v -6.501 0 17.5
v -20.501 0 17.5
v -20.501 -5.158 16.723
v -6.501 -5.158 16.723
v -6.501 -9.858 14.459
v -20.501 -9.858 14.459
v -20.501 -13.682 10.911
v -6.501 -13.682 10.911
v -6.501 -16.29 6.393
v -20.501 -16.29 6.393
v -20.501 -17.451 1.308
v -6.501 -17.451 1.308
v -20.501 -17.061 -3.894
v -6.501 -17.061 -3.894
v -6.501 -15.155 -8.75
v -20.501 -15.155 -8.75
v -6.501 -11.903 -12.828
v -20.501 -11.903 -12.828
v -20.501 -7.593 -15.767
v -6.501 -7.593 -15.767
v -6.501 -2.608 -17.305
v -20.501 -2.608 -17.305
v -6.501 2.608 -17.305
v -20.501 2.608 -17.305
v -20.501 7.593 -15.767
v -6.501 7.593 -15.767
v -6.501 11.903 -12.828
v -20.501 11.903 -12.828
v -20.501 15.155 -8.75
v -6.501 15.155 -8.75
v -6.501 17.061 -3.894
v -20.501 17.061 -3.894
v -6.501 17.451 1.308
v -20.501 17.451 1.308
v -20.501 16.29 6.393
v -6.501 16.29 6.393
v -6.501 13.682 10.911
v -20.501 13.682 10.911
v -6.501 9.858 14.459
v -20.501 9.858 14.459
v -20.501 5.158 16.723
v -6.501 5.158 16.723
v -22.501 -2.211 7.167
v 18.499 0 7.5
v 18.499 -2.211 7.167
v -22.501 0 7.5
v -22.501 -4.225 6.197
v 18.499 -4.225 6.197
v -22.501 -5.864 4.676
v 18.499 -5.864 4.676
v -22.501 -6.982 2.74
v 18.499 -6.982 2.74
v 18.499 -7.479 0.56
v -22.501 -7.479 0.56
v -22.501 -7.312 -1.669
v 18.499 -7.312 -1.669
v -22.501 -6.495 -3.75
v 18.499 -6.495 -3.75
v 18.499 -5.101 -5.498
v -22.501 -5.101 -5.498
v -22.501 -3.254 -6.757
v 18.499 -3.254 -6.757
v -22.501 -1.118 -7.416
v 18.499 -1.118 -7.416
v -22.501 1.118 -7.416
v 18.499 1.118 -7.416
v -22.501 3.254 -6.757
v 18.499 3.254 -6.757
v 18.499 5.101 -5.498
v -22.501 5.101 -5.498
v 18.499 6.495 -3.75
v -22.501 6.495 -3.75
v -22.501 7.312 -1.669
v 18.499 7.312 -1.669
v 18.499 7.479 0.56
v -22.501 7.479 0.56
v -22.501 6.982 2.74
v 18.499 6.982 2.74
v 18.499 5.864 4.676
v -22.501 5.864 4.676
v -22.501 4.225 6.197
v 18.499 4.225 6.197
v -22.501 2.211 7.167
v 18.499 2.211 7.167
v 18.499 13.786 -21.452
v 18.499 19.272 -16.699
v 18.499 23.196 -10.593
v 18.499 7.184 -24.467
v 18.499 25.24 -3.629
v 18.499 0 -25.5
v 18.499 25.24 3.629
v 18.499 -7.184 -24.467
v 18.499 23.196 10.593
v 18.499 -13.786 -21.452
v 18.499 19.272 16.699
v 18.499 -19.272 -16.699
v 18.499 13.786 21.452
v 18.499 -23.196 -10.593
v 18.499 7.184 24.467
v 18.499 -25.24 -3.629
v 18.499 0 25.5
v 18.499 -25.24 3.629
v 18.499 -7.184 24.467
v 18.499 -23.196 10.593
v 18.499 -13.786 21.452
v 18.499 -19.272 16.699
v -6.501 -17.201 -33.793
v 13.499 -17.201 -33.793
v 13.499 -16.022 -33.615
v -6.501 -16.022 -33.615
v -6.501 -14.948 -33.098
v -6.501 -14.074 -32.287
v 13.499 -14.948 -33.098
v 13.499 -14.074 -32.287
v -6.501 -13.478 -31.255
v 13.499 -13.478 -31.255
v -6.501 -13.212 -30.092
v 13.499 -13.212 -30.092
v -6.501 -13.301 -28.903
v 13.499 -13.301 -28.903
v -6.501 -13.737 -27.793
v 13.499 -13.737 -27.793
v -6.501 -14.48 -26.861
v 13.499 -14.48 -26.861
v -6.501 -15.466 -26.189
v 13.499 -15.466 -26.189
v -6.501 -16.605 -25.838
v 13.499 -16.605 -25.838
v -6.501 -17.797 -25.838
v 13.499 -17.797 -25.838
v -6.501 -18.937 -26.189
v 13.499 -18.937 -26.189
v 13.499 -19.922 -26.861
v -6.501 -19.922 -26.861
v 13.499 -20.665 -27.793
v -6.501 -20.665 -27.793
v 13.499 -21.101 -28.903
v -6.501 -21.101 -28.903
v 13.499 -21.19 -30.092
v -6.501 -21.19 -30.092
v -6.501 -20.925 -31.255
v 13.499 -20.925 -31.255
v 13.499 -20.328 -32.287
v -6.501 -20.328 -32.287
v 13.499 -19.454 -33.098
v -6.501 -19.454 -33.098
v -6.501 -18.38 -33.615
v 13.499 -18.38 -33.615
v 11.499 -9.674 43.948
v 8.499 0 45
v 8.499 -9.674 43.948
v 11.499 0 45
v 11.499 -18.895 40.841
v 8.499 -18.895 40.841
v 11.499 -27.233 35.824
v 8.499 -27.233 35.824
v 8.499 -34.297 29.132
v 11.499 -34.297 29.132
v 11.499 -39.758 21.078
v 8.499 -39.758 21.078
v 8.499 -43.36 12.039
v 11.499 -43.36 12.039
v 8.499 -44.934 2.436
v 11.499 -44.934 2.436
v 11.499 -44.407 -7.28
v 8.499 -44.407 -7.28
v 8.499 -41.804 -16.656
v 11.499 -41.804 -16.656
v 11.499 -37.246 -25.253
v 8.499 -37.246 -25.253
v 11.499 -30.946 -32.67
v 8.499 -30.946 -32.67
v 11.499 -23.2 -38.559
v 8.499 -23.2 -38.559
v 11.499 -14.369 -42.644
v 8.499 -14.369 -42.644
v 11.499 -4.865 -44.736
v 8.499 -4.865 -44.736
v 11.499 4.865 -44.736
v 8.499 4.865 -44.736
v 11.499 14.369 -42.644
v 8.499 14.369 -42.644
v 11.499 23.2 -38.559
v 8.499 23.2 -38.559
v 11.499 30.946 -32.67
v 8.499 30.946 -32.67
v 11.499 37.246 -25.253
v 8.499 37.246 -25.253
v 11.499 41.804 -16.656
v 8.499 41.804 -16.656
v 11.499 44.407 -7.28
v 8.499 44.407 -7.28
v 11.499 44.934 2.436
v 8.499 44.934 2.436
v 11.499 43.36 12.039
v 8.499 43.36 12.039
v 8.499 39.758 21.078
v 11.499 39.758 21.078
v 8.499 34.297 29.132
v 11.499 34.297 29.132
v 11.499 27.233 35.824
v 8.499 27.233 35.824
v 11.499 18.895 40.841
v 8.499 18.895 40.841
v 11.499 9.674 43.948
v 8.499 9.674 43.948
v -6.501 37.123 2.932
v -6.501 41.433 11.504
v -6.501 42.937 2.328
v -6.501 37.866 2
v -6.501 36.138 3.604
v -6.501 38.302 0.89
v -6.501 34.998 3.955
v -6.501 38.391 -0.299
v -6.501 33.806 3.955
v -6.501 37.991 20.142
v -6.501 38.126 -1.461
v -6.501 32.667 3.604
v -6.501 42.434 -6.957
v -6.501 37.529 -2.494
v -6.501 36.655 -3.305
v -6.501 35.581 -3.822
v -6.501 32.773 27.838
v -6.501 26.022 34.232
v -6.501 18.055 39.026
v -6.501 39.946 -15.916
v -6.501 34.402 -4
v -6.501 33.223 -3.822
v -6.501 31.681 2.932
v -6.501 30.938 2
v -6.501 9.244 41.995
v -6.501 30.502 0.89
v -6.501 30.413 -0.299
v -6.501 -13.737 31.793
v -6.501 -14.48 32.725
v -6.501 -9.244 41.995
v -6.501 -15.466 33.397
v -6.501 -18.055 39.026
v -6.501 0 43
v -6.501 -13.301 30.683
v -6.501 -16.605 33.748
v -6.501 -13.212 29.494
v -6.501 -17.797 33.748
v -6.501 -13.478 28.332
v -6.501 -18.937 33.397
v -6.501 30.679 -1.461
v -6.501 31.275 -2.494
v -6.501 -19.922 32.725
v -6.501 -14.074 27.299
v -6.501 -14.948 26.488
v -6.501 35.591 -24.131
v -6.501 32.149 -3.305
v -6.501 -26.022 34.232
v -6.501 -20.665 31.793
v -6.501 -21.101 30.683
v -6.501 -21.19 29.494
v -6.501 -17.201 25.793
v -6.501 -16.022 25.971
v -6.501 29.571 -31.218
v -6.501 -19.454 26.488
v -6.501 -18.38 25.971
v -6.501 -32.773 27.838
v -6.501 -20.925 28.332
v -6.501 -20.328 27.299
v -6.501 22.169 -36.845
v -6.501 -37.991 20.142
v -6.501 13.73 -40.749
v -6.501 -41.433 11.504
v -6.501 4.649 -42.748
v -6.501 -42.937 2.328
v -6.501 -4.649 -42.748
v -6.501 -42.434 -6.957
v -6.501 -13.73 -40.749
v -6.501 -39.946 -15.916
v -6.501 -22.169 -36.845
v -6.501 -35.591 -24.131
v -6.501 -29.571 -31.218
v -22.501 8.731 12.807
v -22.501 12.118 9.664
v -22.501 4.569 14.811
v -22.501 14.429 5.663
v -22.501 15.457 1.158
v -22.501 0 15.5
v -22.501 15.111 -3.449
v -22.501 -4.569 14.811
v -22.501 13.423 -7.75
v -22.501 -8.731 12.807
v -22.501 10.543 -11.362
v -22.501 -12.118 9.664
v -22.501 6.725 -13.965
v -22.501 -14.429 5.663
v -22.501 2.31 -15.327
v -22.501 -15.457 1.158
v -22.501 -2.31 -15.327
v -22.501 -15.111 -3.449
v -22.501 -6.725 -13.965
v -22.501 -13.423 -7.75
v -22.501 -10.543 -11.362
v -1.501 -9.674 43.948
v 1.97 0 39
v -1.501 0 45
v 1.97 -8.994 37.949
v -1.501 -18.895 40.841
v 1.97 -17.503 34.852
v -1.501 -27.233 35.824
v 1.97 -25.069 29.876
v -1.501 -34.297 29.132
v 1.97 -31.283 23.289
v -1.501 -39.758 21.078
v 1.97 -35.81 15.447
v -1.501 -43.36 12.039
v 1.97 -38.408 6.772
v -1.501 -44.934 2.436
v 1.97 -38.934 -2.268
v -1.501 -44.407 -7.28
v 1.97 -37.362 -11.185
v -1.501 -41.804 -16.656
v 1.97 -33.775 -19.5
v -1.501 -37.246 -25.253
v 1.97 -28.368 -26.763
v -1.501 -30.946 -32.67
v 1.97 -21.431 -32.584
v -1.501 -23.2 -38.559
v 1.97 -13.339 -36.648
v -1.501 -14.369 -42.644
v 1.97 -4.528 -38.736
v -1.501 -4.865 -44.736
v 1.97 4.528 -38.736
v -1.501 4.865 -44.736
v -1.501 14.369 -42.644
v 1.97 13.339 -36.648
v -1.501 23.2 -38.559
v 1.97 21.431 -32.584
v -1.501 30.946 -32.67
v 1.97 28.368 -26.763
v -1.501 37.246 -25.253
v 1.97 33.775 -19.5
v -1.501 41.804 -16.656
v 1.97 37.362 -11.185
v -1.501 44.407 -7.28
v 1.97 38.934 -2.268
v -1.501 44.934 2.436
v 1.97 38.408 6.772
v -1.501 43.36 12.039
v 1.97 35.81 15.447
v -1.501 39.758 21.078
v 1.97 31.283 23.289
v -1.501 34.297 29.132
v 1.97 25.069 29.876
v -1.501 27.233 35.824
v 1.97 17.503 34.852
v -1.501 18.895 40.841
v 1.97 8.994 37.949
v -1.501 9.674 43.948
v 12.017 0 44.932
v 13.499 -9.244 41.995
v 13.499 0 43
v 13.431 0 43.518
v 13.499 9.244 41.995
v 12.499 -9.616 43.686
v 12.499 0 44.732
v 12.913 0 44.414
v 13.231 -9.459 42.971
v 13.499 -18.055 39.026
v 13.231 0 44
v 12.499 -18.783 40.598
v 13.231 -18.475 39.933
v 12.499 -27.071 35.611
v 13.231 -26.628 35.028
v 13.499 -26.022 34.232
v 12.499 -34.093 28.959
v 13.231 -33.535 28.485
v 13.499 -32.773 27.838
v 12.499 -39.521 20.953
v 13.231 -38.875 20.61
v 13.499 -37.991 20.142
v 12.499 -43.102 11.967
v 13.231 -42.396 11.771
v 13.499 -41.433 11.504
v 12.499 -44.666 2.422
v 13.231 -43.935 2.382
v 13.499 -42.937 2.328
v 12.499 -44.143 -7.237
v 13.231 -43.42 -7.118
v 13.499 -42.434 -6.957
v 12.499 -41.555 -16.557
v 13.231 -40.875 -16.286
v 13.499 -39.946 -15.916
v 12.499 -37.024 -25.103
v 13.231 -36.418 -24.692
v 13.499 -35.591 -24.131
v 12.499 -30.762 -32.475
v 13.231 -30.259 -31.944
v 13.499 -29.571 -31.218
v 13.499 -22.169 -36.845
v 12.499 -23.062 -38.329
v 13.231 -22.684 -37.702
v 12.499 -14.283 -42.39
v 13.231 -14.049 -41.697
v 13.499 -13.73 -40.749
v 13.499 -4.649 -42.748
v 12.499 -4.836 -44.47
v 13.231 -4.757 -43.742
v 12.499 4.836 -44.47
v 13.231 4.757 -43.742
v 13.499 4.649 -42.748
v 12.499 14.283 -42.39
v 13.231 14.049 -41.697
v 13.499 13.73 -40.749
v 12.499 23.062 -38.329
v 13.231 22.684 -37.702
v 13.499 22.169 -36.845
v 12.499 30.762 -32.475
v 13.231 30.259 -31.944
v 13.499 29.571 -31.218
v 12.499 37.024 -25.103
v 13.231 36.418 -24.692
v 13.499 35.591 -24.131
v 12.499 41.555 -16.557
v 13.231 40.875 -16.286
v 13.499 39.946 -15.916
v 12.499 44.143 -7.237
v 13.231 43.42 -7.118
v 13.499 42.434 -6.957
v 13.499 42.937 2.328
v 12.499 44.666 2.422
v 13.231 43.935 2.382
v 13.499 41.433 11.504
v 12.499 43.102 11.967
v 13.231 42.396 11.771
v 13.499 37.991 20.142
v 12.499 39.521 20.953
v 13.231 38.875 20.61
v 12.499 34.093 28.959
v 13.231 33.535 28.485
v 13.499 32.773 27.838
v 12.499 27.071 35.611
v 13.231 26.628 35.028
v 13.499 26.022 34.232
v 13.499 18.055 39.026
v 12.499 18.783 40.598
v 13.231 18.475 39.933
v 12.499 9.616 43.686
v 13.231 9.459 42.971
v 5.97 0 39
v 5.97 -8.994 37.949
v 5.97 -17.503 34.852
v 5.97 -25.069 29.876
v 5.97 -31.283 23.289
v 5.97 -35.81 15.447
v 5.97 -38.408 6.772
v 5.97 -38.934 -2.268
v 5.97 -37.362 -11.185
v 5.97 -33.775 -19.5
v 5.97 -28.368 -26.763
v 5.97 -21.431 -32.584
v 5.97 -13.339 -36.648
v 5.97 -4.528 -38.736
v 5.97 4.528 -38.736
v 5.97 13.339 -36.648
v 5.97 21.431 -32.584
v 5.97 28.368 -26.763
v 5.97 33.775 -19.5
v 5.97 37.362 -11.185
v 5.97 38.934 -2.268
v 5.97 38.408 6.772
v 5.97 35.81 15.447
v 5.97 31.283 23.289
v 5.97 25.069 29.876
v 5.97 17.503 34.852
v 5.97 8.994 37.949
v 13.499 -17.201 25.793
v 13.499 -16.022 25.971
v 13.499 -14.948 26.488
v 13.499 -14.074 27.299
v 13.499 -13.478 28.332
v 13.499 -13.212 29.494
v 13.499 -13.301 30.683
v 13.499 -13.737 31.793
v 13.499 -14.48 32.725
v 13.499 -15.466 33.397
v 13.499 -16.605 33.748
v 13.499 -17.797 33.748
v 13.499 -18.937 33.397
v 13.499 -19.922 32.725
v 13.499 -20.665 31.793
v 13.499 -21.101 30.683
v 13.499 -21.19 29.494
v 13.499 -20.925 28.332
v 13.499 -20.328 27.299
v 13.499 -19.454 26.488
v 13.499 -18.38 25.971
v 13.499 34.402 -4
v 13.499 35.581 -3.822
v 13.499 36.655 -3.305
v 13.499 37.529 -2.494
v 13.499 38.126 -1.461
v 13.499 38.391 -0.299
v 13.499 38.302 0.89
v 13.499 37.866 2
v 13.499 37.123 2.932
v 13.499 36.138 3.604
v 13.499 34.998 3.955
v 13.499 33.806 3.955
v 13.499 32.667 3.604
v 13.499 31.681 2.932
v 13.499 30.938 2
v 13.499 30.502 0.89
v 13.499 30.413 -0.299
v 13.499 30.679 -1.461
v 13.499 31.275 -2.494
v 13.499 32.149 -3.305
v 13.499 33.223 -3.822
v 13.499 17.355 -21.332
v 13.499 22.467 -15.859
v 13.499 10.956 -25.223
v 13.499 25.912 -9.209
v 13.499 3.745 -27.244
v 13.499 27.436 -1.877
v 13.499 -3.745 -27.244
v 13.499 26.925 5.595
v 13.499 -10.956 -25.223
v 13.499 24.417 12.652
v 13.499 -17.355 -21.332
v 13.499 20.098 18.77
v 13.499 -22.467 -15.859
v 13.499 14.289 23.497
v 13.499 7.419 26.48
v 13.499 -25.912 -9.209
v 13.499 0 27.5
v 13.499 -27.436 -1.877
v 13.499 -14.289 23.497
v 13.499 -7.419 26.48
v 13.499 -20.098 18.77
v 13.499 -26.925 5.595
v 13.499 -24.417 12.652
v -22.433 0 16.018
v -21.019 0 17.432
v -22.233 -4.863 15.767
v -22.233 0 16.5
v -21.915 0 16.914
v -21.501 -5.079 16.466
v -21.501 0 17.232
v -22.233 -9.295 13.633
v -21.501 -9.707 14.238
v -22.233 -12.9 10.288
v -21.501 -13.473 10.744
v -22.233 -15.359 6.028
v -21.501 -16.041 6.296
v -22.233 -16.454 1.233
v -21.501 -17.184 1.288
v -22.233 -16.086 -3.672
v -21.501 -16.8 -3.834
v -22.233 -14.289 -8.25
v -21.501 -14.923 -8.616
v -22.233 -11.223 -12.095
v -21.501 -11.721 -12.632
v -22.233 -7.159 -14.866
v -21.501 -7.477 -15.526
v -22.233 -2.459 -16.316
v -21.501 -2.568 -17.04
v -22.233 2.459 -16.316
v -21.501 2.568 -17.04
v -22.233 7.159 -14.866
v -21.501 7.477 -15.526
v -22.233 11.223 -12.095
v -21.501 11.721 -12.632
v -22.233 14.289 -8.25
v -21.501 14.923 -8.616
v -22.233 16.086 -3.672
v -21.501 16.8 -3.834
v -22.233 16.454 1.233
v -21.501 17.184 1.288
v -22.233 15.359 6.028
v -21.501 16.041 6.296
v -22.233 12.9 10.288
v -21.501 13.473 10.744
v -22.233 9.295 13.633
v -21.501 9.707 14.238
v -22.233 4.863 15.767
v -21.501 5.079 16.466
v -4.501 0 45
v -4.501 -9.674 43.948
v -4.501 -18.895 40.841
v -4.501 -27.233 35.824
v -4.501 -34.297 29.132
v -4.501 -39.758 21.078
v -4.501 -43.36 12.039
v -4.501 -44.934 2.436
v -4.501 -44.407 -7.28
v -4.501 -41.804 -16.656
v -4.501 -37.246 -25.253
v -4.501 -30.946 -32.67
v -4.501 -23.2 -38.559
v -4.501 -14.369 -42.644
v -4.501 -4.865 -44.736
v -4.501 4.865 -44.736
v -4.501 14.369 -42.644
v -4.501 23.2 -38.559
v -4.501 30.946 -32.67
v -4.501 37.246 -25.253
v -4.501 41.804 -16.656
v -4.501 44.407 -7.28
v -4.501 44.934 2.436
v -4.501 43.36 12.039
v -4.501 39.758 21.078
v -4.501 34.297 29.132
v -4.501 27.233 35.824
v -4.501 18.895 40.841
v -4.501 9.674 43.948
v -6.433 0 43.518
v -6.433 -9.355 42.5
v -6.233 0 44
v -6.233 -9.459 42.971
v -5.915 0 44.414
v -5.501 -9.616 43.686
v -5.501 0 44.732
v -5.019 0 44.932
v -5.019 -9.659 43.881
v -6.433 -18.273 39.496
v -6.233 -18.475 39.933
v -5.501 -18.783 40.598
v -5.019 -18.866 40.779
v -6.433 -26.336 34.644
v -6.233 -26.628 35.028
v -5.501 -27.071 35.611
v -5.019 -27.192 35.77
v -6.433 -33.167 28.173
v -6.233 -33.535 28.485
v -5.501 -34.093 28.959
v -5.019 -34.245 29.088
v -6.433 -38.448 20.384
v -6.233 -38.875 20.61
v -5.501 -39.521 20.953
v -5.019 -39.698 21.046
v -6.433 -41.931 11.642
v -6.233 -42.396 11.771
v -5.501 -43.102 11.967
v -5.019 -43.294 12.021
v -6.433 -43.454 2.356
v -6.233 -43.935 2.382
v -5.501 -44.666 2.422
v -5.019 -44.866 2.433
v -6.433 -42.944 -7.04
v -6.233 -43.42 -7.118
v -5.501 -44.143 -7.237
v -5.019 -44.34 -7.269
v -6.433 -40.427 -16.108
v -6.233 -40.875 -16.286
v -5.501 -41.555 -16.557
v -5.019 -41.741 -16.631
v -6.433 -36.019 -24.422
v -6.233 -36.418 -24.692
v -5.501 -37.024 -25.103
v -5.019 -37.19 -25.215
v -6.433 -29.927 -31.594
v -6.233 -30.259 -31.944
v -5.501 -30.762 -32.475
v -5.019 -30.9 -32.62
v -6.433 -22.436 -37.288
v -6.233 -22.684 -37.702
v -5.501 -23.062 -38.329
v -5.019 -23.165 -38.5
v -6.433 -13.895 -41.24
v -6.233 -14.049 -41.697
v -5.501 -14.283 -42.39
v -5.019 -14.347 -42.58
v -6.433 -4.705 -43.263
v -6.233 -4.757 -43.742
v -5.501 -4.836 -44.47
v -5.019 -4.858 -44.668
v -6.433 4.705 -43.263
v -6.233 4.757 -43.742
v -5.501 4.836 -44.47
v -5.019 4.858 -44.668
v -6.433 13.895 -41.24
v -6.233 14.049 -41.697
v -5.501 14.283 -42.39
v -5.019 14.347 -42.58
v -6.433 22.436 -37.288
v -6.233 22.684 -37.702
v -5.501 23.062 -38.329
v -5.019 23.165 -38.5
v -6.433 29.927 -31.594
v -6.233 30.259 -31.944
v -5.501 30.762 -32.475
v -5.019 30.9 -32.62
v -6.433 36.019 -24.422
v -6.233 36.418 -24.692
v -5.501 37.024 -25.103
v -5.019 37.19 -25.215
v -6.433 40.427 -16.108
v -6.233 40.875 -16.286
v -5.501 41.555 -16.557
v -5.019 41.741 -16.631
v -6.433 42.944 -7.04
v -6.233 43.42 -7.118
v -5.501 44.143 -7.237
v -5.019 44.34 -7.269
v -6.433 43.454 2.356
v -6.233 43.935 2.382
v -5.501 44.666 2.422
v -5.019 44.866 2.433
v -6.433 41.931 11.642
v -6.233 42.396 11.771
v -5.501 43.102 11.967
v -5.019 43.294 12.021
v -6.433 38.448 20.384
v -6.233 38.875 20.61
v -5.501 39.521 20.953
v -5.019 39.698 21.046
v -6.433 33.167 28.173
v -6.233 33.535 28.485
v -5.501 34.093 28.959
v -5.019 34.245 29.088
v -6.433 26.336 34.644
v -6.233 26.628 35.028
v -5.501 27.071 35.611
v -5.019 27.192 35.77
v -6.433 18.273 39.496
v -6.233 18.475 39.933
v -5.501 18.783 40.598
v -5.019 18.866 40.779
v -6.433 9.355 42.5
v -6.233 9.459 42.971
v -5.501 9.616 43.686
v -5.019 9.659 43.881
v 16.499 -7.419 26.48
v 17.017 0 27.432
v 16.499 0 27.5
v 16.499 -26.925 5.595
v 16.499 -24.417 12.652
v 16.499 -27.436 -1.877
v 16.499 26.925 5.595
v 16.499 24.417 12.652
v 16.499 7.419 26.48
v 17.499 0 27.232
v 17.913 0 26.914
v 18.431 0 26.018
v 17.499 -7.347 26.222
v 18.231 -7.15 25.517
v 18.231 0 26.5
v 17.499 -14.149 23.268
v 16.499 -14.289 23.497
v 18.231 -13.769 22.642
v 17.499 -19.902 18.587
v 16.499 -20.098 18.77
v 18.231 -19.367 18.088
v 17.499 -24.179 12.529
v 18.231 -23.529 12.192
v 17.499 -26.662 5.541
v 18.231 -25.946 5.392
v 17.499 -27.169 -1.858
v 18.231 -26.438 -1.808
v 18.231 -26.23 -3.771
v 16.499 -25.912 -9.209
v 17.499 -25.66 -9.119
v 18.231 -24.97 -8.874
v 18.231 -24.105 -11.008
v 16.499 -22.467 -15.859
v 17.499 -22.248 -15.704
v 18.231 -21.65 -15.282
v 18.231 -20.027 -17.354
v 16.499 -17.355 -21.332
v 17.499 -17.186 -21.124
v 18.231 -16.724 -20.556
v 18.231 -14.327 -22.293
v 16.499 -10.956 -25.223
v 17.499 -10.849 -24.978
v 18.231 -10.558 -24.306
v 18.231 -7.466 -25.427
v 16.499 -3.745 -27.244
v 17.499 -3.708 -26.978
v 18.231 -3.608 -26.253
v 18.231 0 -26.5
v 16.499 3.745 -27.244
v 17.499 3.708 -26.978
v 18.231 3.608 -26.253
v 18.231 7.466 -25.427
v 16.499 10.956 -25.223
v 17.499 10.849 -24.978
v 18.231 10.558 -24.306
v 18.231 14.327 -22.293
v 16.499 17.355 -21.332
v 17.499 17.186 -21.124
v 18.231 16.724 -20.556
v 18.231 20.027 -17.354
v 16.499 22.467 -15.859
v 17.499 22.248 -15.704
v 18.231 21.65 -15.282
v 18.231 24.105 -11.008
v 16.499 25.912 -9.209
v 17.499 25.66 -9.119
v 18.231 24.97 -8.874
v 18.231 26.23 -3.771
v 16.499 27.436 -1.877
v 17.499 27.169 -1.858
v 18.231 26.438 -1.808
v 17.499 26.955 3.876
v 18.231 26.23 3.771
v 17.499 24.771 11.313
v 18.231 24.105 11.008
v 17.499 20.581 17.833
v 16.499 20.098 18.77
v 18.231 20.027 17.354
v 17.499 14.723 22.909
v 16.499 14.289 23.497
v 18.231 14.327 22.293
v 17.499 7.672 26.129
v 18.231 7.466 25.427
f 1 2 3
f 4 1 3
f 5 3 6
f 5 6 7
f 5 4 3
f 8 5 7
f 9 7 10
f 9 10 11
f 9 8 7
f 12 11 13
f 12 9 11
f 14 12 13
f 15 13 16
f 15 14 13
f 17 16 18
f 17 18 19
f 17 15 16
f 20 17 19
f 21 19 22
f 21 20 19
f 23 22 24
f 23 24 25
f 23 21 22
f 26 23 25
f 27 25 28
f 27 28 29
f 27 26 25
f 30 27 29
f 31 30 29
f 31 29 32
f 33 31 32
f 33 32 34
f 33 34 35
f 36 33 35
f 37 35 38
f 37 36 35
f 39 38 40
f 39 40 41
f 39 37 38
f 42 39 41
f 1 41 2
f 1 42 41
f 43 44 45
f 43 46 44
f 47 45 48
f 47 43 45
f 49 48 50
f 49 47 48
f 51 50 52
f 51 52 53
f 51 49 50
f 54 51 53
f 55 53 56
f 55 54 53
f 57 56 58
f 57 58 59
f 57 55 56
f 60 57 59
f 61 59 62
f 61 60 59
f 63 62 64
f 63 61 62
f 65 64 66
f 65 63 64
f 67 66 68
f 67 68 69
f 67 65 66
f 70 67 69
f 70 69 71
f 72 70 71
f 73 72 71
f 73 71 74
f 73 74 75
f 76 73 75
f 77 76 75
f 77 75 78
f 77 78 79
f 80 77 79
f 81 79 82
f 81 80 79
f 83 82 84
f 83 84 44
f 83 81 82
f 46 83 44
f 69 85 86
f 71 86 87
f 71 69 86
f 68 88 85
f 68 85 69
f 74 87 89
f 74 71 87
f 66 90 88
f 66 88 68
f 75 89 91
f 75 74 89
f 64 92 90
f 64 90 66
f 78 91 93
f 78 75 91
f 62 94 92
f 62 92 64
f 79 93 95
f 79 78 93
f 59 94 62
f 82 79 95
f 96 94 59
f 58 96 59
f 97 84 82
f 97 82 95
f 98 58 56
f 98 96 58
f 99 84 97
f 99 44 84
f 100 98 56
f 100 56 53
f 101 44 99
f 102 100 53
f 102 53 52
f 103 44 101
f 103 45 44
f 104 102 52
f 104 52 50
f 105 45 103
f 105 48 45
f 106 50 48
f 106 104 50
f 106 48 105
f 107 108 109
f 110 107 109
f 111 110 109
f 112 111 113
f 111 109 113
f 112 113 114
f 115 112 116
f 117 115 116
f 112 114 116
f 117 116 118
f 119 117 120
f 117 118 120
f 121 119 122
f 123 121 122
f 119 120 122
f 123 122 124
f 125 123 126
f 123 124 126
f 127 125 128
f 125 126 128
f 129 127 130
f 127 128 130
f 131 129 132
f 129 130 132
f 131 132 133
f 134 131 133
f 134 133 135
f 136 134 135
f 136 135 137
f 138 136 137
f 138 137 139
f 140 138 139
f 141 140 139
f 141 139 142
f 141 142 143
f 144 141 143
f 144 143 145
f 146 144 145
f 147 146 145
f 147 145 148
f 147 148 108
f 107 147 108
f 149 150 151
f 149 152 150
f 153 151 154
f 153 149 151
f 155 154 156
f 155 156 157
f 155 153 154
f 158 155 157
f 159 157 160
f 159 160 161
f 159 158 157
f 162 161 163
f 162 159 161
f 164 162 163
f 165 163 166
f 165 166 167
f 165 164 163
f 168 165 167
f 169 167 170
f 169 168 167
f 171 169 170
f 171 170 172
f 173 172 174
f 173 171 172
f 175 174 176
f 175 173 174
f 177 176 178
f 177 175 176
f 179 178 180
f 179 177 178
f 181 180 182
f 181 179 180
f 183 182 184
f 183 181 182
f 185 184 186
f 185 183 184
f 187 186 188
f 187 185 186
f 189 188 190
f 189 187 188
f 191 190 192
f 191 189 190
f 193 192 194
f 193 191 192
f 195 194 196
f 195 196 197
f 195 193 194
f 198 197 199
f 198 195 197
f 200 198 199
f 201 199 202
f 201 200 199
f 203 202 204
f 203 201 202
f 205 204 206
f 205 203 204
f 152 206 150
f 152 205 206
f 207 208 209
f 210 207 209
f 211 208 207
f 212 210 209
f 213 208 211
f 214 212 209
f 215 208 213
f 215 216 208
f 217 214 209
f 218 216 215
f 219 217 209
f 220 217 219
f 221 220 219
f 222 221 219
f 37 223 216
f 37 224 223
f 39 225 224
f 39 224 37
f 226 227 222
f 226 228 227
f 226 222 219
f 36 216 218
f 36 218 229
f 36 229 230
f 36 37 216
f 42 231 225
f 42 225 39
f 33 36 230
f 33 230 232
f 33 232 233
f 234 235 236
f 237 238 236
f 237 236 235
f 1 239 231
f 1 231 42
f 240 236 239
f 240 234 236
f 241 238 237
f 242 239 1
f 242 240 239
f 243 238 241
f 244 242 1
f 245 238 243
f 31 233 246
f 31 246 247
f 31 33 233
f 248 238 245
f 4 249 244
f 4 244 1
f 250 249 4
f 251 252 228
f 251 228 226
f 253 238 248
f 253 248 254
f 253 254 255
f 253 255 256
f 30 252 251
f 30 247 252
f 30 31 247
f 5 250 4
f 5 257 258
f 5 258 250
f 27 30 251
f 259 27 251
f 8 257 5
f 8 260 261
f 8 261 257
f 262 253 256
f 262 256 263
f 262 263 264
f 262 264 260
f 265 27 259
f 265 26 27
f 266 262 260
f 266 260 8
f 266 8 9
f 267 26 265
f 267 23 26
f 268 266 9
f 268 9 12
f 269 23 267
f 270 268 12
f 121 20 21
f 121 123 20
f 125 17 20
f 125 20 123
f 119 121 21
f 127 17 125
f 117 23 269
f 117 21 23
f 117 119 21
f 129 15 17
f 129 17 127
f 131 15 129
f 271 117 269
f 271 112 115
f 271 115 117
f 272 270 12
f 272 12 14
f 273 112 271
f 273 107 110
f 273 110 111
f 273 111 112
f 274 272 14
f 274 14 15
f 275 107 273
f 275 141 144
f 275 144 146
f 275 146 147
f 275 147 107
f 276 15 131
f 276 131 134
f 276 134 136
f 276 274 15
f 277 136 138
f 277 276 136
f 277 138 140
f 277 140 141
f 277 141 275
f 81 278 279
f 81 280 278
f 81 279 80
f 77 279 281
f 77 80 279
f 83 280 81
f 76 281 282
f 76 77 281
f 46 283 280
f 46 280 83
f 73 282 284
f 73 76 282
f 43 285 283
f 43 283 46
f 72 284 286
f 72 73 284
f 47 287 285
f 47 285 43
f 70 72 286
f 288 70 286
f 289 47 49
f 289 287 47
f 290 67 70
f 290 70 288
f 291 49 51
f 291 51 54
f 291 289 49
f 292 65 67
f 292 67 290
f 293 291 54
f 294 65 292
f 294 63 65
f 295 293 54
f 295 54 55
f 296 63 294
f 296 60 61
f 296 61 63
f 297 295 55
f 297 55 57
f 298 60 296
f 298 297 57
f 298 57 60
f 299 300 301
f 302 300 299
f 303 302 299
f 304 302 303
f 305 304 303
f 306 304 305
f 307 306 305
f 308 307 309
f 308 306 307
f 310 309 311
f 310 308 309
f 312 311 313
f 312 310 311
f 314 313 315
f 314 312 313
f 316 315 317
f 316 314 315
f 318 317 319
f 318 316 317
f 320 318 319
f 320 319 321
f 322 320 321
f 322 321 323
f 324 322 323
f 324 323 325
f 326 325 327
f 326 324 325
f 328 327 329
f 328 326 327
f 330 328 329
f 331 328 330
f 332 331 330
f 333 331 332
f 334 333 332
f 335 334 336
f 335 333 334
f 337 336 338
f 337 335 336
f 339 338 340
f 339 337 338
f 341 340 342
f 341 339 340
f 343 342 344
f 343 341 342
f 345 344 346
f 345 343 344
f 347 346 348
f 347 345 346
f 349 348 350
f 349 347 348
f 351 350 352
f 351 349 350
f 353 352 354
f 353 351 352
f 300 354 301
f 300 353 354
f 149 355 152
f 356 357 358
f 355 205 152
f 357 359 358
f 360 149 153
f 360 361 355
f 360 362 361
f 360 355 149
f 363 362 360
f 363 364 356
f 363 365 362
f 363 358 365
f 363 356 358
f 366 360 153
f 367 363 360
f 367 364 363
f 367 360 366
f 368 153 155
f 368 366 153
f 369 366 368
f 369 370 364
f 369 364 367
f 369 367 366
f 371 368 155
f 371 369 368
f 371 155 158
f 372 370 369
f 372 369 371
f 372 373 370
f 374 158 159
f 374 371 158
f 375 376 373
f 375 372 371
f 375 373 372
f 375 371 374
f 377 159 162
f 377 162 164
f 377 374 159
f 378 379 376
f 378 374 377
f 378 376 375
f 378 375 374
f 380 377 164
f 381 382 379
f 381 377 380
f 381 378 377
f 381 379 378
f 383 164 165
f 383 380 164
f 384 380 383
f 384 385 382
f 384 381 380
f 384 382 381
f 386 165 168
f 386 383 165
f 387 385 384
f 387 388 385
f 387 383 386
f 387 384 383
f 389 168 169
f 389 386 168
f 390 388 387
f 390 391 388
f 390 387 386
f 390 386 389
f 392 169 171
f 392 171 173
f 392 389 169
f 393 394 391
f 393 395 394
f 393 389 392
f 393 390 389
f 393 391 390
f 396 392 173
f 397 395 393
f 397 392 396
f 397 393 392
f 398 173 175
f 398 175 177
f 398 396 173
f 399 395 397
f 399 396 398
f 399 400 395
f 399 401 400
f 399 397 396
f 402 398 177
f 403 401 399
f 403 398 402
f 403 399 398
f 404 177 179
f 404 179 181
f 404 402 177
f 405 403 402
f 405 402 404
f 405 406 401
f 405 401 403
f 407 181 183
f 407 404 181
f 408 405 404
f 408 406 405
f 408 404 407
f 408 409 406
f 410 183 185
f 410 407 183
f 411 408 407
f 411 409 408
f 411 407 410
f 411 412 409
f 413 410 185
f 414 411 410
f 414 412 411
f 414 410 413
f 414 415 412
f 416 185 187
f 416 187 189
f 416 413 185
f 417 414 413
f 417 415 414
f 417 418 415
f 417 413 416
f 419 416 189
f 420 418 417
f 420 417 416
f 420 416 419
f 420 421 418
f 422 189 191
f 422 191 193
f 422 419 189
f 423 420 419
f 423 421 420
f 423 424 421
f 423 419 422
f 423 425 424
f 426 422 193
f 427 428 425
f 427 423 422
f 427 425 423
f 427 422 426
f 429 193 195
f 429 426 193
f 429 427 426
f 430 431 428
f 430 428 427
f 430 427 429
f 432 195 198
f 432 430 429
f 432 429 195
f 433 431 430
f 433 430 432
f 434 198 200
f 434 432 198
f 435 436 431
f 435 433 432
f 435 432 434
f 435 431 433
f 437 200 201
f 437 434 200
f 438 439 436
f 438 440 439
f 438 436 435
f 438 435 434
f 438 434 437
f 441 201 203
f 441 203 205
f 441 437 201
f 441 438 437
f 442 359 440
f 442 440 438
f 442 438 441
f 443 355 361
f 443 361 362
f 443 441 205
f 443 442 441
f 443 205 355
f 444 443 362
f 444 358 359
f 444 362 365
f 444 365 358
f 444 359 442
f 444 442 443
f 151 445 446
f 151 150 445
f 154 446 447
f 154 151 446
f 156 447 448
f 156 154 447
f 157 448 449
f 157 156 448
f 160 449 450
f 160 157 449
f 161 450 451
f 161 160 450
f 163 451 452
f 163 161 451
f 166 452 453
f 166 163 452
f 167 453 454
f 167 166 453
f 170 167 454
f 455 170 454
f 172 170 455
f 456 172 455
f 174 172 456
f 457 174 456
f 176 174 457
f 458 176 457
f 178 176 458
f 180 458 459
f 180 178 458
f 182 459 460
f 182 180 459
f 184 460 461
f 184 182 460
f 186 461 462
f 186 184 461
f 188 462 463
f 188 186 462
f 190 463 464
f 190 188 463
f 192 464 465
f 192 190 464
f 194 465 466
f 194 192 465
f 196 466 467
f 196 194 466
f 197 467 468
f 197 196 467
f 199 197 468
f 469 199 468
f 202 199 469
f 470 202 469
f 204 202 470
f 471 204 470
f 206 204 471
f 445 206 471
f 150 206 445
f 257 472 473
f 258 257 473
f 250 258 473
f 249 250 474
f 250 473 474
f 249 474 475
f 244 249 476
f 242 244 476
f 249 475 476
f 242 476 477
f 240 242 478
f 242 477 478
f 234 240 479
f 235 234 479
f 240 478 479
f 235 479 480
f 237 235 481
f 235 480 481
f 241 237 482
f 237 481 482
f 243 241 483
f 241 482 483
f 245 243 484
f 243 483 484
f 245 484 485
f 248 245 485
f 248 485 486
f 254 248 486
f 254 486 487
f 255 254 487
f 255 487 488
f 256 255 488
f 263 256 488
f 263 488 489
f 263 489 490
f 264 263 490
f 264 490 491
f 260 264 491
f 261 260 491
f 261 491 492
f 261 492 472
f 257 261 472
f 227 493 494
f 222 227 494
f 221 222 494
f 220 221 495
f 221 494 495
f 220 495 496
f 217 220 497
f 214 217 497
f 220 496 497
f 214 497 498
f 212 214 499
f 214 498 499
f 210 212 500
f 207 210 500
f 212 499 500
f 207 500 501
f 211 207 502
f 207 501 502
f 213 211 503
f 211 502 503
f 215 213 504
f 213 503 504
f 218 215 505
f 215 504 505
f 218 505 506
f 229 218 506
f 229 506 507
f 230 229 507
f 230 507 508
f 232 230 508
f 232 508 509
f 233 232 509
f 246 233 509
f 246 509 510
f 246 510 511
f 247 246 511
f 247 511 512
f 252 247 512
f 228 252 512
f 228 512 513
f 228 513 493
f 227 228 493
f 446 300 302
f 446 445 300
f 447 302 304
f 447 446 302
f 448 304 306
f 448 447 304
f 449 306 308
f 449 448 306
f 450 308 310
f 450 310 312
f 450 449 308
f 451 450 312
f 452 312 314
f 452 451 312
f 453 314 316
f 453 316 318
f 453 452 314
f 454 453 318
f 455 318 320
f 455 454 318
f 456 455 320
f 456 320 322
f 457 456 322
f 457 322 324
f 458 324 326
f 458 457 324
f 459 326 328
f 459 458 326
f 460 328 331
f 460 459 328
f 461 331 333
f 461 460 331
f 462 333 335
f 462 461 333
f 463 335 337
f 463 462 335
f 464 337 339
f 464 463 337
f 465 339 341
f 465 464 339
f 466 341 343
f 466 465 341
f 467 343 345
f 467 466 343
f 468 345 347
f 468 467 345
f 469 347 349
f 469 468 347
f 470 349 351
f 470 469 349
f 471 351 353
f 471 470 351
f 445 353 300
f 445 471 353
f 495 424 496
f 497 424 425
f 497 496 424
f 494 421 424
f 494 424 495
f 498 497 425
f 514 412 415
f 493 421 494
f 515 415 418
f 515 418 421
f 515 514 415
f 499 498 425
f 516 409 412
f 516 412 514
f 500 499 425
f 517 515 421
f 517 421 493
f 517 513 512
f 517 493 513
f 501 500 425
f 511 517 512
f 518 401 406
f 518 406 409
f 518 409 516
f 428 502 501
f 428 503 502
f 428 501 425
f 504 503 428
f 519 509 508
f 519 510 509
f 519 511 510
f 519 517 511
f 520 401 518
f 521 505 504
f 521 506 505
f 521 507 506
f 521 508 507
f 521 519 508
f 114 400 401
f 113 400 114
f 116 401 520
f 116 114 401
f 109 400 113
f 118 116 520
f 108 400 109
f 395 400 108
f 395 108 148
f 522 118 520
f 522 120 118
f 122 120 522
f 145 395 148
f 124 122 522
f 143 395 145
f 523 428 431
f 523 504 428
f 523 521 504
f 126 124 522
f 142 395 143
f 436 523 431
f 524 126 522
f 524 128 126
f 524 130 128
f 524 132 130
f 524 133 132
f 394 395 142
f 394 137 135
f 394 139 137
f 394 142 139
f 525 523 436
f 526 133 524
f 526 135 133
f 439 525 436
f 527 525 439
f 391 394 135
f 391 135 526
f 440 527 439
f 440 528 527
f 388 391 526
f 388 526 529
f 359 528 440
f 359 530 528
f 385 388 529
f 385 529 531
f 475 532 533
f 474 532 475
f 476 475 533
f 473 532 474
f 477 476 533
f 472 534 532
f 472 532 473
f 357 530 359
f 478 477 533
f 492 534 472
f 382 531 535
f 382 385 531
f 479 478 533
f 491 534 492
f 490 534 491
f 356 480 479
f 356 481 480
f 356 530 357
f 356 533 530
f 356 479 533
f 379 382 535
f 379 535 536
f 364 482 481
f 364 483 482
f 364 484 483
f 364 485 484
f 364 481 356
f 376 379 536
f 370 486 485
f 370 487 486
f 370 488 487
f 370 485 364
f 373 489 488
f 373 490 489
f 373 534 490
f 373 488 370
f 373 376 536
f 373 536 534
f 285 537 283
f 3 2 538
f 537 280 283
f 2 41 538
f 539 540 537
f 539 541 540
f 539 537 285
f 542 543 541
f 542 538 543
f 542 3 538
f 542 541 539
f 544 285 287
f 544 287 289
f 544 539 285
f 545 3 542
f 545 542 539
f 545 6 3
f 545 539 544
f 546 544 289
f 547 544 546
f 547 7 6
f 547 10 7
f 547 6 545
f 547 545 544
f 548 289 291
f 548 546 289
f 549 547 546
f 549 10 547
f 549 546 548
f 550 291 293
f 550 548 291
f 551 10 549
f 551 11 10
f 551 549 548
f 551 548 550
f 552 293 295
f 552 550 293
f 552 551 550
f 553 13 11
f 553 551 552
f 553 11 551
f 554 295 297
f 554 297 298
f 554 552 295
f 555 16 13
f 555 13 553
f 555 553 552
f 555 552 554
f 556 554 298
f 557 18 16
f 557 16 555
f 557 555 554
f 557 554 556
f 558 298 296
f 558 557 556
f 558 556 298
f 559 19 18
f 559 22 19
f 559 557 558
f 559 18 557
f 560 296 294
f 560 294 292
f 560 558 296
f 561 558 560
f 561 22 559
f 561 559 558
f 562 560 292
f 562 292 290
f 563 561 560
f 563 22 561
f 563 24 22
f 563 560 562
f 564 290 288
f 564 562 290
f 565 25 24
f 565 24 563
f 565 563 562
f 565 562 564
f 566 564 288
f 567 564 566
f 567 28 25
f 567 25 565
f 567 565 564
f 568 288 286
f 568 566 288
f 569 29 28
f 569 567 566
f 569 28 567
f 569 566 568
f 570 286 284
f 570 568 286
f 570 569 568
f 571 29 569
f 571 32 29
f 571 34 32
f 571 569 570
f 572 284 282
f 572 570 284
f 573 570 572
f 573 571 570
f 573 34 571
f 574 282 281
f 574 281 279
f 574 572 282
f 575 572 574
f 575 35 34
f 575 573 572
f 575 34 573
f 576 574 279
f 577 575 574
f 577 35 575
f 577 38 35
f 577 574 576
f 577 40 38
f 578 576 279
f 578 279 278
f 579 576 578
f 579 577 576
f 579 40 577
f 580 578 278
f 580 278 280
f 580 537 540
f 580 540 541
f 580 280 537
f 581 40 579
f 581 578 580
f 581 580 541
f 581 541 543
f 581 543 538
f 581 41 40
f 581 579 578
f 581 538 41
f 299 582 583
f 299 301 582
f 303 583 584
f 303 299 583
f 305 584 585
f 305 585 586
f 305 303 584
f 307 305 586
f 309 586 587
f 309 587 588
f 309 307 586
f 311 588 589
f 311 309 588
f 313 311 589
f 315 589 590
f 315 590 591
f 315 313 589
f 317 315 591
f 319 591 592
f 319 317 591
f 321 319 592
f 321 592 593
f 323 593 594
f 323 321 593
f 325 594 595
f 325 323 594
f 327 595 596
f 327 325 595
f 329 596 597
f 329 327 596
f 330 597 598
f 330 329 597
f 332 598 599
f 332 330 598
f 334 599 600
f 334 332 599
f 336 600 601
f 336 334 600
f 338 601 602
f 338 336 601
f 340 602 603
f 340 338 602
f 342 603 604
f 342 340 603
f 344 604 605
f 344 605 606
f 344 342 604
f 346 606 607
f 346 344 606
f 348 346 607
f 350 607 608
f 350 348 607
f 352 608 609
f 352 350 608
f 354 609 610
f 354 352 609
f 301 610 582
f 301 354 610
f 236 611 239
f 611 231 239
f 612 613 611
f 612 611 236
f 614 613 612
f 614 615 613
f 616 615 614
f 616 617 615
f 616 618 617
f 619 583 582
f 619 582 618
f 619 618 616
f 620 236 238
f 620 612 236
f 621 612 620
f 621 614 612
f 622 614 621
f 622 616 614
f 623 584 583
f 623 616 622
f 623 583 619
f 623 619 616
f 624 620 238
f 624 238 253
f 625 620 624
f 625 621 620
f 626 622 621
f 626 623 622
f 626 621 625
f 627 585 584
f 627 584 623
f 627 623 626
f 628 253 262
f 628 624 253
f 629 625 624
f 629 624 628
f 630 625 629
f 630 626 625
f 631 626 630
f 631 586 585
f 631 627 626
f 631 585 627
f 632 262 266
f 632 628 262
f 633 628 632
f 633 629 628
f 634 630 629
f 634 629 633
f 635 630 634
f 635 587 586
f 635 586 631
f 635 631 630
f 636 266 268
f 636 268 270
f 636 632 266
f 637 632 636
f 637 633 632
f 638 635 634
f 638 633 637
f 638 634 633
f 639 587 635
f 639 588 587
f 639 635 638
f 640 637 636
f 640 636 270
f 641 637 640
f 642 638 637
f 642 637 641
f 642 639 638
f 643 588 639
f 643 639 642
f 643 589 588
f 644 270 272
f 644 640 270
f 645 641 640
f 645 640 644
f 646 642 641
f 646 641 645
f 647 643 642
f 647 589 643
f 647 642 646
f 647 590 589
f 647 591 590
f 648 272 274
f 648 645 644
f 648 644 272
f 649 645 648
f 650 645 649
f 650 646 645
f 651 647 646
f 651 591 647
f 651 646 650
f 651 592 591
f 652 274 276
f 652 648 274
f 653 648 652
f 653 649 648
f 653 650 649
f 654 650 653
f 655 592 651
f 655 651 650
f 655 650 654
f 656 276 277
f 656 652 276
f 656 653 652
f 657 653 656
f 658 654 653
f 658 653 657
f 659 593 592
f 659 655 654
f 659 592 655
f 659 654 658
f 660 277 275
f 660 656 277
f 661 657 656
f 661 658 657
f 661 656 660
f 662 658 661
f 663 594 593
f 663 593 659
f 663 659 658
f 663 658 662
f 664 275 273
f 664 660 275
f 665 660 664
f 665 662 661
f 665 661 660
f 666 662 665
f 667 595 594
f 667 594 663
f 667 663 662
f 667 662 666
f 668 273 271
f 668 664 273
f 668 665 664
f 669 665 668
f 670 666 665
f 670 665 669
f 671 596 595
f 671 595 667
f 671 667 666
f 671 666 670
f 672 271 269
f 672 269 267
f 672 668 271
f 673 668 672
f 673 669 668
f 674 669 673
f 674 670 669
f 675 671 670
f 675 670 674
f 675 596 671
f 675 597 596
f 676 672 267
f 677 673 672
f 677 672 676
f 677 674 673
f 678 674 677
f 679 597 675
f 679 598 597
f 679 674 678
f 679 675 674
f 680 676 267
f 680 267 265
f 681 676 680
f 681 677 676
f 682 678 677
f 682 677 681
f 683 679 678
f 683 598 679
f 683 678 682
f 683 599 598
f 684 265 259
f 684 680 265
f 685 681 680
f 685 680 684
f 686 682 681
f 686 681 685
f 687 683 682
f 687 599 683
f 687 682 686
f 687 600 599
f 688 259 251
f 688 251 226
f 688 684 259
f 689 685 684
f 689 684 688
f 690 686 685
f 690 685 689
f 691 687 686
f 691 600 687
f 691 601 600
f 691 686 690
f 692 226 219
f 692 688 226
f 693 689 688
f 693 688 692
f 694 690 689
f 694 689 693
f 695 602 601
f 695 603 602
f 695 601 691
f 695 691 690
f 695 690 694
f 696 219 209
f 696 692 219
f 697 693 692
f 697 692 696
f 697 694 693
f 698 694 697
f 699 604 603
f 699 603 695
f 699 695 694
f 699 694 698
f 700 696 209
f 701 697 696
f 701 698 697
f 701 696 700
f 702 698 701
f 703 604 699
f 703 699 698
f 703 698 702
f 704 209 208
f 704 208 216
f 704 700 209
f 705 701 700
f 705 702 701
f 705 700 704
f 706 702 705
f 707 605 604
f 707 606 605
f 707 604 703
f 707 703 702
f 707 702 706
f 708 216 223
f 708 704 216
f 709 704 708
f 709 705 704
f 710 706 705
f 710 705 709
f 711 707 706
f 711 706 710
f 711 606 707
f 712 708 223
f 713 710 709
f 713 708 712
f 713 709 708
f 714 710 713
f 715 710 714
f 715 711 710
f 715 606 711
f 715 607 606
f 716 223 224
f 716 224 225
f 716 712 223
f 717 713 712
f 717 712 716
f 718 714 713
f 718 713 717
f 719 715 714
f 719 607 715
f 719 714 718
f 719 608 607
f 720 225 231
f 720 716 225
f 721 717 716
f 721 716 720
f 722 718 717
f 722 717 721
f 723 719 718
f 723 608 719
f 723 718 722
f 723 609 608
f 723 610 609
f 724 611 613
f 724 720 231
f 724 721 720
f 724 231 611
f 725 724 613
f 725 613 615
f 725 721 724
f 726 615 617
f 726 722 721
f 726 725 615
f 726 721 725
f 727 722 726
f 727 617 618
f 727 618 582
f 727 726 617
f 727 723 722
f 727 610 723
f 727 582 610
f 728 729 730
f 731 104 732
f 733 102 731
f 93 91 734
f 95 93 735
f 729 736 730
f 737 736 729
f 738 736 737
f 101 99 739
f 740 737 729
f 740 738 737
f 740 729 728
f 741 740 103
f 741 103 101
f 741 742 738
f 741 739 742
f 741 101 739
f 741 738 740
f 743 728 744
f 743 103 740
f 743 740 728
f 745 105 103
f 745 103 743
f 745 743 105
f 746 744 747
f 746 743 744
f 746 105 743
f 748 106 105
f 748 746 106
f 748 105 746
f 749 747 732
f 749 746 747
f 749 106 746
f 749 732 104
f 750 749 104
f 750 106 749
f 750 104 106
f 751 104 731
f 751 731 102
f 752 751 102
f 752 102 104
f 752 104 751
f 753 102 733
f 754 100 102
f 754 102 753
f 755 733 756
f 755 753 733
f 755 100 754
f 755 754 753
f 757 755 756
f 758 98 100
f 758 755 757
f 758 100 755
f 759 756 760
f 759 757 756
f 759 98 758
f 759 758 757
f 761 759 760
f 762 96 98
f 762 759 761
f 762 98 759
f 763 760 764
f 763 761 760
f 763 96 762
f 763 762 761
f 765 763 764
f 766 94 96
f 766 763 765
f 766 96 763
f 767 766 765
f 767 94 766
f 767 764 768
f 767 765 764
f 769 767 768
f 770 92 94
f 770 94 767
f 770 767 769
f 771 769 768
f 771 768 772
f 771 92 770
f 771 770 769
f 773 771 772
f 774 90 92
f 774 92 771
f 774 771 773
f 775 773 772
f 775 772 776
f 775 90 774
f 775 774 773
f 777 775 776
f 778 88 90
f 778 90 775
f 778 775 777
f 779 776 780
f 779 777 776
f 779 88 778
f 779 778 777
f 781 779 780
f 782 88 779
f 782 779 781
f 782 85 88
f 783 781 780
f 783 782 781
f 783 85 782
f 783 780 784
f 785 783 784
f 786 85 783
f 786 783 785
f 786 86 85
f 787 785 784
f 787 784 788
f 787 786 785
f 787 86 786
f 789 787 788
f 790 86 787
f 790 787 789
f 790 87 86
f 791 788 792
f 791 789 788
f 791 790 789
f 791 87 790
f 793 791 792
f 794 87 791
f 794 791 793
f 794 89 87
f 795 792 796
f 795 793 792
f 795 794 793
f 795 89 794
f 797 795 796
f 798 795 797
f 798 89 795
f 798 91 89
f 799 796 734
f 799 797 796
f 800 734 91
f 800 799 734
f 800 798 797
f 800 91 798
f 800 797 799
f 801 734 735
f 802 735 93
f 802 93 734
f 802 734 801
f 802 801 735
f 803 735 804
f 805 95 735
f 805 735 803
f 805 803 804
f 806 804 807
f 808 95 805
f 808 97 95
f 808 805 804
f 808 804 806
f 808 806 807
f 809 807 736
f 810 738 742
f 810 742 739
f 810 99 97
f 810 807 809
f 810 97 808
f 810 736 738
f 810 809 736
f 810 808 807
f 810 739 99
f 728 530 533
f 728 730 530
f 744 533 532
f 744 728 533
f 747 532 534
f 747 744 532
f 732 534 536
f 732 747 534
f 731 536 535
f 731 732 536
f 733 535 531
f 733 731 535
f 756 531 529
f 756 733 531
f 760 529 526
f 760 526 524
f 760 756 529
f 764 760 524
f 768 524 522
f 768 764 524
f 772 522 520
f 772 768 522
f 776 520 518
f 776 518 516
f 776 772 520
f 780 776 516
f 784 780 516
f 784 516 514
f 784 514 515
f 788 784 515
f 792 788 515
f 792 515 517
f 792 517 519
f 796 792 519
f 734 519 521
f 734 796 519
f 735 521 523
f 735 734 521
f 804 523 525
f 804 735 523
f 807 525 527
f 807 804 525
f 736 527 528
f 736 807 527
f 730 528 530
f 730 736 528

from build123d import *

# Parameters (mm, degrees)
IZIM2_R               = 4
KES_EKSTR_ZYON2_DEPTH = 74.116345765


with BuildPart() as part:
    # Çizim1 → Döndür2 (revolve)
    with BuildSketch(Plane.XY, mode=Mode.PRIVATE) as d_nd_r2_sk:
        with BuildLine():
            Line((-1.500885478, 45), (1.970188902, 39))
            Line((1.970188902, 39), (5.970188902, 39))
            Line((5.970188902, 39), (8.499114522, 45))
            Line((8.499114522, 45), (11.499114522, 45))
            ThreePointArc((11.499114522, 45), (12.913328084, 44.414213562), (13.499114522, 43))
            Line((13.499114522, 43), (13.499114522, 27.5))
            Line((13.499114522, 27.5), (16.499114522, 27.5))
            ThreePointArc((16.499114522, 27.5), (17.913328084, 26.914213562), (18.499114522, 25.5))
            Line((18.499114522, 25.5), (18.499114522, 20.020661157))
            Line((18.499114522, 20.020661157), (18.499114522, 7.5))
            Line((18.499114522, 7.5), (-22.500885478, 7.5))
            Line((-22.500885478, 7.5), (-22.500885478, 15.5))
            ThreePointArc((-22.500885478, 15.5), (-21.915099041, 16.914213562), (-20.500885478, 17.5))
            Line((-20.500885478, 17.5), (-6.500885478, 17.5))
            Line((-6.500885478, 17.5), (-6.500885478, 24.44214876))
            Line((-6.500885478, 24.44214876), (-6.500885478, 43))
            ThreePointArc((-6.500885478, 43), (-5.915099041, 44.414213562), (-4.500885478, 45))
            Line((-4.500885478, 45), (-1.500885478, 45))
        make_face()
    revolve(d_nd_r2_sk.sketch.rotate(Axis((-33.856257379, 0, 0), (1, 0, 0)), 90), axis=Axis((-33.856257379, 0, 0), (1, 0, 0)))

    # Çizim2 → Kes-Ekstrüzyon2 (cut, through all)
    with BuildSketch(Plane(origin=(13.499114522, 0, 0), x_dir=(0, 0, -1), z_dir=(1, 0, 0))):
        with Locations((0, 34.402169776)):
            Circle(IZIM2_R)
        with Locations((29.793152971, -17.201084888)):
            Circle(IZIM2_R)
        with Locations((-29.793152971, -17.201084888)):
            Circle(IZIM2_R)
    extrude(amount=-KES_EKSTR_ZYON2_DEPTH, mode=Mode.SUBTRACT)


solid = part.part
